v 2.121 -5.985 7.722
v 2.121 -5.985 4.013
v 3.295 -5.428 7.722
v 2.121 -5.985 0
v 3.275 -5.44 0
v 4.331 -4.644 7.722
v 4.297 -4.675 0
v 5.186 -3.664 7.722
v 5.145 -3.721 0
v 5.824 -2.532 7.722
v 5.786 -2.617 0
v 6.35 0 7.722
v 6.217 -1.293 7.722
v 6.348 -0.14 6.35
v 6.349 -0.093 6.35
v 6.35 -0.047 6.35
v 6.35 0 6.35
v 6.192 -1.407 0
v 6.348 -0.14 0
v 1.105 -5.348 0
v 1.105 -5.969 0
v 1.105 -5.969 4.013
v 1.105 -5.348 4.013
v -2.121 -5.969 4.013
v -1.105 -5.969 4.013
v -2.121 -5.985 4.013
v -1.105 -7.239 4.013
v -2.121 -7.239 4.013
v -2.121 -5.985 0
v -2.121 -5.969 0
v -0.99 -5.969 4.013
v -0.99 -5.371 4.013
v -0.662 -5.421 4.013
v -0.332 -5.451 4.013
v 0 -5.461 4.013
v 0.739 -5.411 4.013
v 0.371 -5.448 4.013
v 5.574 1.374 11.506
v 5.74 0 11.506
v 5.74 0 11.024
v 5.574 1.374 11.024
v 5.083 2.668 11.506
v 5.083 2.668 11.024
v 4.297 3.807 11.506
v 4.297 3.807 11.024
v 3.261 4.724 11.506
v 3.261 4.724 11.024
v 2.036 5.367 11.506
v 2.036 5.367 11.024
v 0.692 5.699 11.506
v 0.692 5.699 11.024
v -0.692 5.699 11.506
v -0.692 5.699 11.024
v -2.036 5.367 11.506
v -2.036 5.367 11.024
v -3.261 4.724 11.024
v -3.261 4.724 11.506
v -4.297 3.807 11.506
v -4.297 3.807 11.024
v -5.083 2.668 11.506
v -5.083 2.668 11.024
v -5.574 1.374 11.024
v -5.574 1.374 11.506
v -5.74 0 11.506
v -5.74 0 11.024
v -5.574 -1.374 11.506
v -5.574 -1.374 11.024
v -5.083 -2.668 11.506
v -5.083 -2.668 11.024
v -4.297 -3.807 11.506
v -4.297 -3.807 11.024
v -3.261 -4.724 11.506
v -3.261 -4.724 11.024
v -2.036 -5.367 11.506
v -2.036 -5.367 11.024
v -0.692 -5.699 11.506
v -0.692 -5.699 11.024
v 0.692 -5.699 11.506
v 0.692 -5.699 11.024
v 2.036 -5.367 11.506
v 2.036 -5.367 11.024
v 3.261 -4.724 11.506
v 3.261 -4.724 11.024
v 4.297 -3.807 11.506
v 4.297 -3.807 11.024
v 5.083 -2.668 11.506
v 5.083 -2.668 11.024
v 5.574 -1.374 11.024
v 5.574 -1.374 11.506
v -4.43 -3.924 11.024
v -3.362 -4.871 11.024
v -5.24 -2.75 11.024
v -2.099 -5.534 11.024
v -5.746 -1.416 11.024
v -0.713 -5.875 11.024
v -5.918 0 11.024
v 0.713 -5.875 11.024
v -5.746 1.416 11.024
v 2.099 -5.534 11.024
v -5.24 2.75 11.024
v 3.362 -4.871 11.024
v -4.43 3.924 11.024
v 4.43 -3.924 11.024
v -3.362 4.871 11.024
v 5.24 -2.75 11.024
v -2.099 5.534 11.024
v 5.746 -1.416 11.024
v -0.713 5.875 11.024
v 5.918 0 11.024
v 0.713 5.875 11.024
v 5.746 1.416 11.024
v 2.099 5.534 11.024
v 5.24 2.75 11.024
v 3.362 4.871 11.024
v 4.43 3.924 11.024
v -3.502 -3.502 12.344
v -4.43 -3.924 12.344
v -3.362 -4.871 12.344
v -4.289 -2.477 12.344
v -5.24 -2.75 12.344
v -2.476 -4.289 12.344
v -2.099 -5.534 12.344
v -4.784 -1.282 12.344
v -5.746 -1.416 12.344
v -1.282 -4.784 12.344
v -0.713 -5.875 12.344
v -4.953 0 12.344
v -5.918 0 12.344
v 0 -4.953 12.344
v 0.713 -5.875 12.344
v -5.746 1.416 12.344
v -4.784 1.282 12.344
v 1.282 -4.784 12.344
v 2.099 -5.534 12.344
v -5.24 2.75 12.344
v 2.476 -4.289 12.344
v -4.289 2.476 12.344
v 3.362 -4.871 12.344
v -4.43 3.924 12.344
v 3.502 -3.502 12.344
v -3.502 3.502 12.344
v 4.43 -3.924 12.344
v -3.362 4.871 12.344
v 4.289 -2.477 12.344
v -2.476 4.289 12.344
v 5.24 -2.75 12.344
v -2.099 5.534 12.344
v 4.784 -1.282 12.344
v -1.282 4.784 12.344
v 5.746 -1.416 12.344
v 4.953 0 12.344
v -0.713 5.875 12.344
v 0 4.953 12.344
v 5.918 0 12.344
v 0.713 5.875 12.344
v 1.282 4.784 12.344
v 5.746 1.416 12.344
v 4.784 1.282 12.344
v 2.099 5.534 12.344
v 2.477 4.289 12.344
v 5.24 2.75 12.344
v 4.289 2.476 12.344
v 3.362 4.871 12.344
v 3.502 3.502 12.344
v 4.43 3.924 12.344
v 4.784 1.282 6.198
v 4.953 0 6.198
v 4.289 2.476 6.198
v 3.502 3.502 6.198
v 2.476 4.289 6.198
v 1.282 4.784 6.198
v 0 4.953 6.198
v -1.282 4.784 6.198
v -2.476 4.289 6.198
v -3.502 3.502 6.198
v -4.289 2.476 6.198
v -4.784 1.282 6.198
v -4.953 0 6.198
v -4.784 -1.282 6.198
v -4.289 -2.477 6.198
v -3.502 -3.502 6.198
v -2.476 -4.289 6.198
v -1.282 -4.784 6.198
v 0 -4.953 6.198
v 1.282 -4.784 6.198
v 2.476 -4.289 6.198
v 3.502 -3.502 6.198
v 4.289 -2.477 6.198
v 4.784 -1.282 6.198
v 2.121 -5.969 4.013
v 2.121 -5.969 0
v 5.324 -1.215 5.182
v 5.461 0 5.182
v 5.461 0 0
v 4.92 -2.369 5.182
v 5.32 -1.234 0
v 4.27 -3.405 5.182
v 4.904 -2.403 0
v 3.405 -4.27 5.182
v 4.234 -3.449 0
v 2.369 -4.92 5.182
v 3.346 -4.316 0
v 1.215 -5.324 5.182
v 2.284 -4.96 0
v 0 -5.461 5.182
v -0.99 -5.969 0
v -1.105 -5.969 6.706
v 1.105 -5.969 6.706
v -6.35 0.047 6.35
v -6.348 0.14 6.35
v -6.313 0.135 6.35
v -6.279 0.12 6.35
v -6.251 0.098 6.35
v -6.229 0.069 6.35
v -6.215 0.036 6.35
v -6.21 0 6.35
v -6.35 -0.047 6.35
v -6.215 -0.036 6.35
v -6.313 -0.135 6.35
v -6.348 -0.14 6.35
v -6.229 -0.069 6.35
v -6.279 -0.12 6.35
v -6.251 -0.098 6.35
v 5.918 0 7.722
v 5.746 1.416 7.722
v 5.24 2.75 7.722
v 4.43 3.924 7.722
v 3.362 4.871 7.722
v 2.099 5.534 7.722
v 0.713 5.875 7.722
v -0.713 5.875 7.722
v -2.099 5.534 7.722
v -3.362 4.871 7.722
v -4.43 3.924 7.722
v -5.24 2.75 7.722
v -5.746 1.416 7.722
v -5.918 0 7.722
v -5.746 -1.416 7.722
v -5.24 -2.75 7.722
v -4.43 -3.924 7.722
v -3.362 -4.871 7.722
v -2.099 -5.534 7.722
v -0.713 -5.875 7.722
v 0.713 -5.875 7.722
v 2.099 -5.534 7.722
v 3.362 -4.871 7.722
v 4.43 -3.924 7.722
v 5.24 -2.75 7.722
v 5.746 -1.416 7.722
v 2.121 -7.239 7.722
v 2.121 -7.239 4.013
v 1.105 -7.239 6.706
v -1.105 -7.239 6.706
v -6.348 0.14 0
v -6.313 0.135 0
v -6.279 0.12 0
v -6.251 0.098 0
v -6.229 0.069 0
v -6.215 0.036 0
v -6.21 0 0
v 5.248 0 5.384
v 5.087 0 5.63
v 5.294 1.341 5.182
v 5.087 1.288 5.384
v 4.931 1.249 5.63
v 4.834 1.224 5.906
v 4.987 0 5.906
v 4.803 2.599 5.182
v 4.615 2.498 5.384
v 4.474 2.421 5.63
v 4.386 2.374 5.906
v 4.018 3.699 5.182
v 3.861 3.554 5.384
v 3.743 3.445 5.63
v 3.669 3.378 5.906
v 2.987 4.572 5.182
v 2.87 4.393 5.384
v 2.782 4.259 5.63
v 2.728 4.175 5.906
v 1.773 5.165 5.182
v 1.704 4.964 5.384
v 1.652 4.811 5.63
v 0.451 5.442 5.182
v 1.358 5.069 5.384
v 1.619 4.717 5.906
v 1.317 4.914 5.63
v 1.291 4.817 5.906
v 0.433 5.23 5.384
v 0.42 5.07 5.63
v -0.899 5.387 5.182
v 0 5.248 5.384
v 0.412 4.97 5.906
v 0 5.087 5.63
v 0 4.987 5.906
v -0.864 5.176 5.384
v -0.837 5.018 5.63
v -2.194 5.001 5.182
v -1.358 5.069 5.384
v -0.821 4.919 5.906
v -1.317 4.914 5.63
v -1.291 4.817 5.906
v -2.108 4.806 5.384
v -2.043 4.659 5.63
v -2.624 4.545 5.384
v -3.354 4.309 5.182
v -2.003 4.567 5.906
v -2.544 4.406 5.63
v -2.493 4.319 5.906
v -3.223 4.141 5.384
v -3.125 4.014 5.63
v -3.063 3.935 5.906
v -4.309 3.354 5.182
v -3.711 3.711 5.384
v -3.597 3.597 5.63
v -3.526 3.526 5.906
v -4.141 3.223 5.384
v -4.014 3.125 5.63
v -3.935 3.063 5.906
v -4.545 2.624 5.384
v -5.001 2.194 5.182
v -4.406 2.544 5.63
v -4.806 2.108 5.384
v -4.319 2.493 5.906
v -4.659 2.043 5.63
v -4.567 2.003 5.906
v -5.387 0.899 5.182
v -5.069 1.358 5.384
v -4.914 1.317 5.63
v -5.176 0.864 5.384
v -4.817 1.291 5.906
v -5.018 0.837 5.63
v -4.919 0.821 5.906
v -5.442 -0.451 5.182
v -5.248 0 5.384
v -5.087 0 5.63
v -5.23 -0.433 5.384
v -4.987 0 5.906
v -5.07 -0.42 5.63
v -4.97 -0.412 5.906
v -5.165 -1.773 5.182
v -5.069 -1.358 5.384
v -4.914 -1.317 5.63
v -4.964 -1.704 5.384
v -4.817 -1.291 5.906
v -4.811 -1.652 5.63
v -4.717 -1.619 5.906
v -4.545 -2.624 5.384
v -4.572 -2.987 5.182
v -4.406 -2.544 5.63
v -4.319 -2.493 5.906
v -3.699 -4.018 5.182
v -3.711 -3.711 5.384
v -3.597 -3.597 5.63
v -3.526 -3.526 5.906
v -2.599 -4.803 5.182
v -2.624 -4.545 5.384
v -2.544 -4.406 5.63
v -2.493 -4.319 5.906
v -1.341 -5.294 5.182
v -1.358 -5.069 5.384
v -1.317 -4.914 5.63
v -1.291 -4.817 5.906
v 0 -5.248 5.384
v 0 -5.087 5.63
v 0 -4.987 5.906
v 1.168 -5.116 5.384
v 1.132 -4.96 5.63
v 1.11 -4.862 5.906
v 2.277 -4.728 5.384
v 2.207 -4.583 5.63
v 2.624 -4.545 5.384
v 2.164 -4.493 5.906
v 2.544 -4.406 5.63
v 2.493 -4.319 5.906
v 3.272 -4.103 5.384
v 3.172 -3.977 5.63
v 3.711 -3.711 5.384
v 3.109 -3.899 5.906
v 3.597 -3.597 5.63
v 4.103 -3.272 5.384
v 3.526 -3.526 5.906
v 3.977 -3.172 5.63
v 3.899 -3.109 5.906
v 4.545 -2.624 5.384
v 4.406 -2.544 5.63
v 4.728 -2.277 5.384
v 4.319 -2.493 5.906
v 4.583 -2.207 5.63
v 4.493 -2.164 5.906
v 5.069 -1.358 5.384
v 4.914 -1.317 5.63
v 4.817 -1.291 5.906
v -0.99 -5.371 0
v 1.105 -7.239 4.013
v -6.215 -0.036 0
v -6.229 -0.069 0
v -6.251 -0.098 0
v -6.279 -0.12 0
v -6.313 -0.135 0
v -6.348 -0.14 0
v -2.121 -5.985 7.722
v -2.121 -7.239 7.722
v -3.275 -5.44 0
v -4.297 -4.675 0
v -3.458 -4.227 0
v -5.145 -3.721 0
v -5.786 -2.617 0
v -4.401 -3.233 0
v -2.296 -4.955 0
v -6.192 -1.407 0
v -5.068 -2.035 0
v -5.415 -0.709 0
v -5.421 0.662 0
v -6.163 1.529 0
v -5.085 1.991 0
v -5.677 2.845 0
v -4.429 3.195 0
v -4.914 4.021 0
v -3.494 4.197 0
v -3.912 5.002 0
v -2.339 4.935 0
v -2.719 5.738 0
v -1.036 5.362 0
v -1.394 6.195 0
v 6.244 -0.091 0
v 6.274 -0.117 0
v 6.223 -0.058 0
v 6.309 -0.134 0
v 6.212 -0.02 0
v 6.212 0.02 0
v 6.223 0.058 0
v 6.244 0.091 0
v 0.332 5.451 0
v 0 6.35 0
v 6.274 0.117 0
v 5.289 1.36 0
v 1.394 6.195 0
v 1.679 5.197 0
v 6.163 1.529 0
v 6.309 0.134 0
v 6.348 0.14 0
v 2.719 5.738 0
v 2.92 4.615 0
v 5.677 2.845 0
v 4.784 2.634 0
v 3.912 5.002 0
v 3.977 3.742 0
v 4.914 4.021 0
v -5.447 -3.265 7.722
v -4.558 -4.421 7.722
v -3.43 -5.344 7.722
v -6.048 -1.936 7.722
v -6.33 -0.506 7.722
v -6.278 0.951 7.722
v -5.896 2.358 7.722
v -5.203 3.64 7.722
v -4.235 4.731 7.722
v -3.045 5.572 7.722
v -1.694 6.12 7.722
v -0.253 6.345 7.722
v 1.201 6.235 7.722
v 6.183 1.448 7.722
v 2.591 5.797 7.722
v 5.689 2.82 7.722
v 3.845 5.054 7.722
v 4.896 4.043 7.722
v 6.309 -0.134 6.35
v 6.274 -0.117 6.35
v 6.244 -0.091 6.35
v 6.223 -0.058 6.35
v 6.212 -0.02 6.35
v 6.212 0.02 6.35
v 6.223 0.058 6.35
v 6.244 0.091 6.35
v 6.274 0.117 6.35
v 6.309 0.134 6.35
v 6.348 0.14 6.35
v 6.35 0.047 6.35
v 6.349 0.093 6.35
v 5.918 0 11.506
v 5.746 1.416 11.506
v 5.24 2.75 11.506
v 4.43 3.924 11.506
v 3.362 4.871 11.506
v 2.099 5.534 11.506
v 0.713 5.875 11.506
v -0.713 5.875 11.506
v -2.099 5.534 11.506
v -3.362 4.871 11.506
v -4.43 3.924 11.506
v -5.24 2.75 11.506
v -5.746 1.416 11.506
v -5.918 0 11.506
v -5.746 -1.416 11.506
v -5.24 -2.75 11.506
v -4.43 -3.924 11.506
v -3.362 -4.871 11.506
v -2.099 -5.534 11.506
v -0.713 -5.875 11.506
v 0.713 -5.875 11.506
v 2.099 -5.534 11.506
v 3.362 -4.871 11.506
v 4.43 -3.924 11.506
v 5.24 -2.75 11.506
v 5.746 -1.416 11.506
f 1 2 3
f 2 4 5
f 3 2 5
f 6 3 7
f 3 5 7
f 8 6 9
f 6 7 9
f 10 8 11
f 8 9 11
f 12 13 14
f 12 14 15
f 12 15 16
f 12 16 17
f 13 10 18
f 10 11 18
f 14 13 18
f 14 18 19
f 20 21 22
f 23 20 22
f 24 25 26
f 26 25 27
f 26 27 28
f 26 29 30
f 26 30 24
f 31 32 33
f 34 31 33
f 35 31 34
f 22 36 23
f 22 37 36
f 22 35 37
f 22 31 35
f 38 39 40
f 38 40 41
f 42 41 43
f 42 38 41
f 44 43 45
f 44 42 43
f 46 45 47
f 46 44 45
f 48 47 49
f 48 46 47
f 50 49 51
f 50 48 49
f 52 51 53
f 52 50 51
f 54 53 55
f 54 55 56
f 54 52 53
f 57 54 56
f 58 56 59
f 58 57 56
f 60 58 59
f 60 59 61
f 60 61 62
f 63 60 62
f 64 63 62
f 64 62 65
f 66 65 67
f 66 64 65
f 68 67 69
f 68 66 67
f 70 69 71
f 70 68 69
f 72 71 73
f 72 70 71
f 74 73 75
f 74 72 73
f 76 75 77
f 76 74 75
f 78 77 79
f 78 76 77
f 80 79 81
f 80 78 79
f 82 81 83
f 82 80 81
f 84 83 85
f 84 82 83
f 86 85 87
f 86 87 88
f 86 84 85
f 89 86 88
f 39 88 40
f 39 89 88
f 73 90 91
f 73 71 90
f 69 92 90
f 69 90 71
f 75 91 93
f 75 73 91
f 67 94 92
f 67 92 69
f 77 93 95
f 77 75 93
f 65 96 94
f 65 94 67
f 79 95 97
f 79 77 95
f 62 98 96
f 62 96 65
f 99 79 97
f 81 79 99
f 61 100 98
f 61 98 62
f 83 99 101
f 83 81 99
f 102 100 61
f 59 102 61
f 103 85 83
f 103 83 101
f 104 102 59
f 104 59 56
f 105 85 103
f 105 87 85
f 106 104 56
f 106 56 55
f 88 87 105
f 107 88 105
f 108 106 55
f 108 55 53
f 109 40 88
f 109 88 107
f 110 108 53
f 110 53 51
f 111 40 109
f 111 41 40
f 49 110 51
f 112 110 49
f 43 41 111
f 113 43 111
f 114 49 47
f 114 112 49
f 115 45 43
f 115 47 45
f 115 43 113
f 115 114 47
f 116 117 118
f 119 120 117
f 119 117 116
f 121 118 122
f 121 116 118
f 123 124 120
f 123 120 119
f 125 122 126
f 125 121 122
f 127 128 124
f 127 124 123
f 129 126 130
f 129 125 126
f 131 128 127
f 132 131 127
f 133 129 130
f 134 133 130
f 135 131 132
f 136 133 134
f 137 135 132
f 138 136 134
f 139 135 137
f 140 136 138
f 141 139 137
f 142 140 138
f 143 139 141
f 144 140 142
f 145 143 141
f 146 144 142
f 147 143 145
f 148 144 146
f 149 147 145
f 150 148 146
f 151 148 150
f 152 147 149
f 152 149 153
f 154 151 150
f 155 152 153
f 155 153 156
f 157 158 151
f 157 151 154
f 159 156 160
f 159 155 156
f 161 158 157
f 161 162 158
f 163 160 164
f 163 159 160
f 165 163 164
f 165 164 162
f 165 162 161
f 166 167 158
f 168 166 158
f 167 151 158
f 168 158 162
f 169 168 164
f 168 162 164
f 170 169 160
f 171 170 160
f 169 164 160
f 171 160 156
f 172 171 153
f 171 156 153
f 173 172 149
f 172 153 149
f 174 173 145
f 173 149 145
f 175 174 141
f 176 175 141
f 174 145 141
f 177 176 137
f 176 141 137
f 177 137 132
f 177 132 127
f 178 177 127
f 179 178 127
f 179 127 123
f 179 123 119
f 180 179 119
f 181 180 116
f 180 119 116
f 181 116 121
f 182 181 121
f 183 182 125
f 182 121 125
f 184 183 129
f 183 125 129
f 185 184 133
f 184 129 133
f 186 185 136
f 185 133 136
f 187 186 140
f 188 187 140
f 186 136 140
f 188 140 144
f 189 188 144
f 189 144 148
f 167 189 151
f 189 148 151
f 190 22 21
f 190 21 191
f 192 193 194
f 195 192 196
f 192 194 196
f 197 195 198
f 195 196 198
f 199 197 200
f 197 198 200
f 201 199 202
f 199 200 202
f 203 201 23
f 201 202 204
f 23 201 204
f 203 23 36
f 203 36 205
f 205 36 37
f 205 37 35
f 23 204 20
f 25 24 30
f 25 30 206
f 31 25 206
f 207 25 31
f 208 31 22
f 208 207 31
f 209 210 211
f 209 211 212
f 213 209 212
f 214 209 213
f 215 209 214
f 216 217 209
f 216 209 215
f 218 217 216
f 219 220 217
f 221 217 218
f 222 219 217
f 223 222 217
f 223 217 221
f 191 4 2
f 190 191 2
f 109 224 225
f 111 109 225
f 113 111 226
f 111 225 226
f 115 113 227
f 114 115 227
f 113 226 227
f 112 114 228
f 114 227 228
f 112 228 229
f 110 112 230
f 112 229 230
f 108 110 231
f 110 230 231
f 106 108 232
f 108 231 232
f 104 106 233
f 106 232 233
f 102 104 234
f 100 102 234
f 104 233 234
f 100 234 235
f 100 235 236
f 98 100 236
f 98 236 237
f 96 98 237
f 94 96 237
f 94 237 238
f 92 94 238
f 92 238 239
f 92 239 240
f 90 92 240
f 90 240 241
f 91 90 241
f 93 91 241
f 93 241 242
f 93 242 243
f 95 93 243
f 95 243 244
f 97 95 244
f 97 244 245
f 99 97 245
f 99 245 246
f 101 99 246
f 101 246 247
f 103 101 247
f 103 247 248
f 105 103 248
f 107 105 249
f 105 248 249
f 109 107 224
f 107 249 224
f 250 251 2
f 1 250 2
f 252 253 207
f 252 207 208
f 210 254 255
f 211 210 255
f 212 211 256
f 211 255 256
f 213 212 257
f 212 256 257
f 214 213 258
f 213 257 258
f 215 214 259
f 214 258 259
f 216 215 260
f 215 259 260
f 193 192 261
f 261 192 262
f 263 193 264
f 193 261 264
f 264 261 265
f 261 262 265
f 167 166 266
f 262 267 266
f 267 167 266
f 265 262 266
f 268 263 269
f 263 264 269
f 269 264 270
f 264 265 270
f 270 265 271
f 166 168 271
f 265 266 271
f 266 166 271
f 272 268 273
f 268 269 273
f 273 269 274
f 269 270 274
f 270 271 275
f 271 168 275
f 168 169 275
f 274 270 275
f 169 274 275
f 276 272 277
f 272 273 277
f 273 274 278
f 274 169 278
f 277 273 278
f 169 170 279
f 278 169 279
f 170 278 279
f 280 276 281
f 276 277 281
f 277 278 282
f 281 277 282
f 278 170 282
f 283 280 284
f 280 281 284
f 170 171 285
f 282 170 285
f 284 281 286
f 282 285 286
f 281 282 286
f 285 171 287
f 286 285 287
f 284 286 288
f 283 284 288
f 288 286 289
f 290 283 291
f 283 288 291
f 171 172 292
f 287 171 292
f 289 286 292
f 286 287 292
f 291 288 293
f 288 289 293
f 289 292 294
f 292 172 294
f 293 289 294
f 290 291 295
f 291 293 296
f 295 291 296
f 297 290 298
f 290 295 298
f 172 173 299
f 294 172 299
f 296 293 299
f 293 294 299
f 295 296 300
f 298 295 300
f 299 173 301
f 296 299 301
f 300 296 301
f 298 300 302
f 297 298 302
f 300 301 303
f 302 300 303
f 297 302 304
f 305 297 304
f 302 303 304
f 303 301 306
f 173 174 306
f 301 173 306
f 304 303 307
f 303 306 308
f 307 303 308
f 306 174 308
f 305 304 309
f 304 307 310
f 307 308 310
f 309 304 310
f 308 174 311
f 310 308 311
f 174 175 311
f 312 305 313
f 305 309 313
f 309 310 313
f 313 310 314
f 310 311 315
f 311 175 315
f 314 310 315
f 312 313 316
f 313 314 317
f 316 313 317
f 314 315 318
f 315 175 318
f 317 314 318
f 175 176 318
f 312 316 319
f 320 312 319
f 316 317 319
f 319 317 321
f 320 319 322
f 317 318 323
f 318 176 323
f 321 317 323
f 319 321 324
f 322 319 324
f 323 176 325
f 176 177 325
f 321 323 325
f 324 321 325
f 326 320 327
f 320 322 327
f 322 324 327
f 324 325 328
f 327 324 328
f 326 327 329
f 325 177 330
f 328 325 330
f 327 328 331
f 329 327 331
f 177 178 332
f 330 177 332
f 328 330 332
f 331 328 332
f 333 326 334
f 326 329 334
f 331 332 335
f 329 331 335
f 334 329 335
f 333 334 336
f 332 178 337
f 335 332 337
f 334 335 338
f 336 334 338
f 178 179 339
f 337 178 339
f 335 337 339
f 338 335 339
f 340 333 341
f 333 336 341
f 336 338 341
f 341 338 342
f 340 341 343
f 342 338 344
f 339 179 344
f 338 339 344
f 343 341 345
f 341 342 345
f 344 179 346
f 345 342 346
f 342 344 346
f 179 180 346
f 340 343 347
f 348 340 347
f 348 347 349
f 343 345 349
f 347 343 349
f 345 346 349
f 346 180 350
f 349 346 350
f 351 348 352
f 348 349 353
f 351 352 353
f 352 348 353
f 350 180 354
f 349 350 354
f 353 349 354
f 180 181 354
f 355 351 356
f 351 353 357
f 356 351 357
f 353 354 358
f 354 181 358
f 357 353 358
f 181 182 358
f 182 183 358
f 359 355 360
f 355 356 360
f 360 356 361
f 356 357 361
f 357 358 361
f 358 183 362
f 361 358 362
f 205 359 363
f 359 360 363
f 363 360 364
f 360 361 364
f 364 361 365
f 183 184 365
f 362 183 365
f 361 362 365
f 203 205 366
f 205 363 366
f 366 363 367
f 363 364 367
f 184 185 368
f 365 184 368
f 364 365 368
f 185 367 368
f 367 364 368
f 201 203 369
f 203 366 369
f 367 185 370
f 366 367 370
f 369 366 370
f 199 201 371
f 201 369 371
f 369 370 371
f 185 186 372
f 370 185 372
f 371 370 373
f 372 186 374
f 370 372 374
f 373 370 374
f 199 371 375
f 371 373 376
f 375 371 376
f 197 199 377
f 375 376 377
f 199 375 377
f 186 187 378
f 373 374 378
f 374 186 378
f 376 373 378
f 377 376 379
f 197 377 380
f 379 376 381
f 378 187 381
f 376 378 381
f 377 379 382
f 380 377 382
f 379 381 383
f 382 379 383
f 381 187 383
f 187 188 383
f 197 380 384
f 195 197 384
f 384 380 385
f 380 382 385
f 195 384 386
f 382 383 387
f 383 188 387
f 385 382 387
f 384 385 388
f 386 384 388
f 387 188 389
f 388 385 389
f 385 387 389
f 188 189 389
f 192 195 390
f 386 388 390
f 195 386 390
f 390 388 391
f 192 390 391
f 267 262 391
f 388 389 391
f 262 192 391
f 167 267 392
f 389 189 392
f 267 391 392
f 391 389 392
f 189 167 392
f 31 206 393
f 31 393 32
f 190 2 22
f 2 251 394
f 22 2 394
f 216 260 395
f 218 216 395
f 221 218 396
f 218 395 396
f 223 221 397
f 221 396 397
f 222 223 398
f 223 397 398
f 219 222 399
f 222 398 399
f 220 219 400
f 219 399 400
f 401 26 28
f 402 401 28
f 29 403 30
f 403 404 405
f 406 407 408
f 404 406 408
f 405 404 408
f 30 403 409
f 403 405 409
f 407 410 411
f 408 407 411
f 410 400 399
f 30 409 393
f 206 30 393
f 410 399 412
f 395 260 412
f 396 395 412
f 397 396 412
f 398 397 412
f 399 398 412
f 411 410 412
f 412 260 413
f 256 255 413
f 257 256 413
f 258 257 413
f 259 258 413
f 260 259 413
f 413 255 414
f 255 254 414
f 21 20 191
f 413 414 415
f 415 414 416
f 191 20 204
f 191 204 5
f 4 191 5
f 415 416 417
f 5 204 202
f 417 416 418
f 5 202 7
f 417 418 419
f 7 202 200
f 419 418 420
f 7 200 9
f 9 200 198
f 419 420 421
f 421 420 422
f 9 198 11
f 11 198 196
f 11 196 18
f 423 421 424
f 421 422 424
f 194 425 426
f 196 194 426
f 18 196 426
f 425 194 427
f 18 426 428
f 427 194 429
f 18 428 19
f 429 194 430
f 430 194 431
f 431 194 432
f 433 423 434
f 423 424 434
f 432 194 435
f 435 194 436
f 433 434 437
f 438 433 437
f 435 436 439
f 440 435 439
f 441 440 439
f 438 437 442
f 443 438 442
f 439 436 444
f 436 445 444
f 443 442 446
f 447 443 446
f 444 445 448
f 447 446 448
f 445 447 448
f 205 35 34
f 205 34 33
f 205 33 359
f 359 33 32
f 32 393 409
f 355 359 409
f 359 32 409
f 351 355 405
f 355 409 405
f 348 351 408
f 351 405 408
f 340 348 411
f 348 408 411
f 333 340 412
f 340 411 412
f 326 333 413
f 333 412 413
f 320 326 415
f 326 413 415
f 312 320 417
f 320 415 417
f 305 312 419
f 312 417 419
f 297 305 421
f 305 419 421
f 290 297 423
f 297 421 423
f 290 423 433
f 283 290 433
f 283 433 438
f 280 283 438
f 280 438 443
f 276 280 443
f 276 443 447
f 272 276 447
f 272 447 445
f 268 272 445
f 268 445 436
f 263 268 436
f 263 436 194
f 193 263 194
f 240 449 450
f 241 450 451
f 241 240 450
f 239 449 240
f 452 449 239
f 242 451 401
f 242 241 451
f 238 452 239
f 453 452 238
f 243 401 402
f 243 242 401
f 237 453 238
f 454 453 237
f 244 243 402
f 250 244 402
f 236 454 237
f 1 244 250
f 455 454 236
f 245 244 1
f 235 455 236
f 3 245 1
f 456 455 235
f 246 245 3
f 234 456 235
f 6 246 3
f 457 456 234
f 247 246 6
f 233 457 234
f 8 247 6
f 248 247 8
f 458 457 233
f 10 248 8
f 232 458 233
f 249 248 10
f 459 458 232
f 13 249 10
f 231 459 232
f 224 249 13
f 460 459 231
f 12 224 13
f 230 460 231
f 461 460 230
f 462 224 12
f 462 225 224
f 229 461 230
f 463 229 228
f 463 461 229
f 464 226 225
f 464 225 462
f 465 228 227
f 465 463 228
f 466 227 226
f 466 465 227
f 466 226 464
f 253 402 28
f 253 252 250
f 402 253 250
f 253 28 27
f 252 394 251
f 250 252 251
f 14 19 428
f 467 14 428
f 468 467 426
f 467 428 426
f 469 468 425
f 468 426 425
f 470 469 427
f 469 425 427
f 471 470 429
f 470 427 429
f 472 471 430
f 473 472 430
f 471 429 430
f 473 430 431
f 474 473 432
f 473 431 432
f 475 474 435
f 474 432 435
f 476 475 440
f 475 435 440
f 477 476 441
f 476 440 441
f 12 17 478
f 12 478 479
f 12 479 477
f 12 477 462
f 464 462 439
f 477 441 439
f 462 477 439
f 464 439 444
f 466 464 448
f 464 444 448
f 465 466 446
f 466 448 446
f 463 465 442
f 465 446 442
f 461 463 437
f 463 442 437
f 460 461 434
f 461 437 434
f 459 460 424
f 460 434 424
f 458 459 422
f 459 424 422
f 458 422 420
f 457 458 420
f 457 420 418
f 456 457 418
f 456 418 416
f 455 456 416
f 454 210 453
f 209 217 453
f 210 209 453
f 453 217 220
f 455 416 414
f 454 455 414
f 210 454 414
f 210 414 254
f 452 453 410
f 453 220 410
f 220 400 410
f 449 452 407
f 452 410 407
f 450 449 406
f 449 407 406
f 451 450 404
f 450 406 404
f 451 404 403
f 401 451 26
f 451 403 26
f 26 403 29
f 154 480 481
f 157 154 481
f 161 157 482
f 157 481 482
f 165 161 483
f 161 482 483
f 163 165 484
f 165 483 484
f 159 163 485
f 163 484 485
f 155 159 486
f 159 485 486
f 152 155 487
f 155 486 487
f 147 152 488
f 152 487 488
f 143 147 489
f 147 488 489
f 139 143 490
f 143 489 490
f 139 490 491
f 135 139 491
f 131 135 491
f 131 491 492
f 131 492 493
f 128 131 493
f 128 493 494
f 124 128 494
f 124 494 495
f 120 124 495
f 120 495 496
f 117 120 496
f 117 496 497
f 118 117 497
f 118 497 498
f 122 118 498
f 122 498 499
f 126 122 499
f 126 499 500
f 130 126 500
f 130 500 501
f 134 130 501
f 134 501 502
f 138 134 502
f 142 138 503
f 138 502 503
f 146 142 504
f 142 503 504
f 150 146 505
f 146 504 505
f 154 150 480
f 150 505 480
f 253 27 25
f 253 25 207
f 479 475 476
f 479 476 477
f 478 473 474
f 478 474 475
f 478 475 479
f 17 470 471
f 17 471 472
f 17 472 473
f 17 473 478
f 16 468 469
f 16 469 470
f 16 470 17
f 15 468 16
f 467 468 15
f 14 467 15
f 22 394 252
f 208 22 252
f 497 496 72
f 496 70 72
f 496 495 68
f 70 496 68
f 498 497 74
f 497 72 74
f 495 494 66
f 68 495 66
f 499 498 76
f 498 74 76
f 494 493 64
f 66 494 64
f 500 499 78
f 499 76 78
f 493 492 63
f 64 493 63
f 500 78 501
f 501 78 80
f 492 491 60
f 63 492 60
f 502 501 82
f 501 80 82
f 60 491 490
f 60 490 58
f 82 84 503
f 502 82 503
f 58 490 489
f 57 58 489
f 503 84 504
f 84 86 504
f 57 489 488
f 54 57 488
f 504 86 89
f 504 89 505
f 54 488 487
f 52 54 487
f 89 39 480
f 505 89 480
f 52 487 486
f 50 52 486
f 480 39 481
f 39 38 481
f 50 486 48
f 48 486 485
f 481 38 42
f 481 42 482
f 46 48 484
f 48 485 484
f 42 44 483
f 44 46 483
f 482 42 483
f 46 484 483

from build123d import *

# Parameters (mm, degrees)
F1_DEPTH      = 7.7216
F2_W          = 2.2098
F2_H          = 4.0132
F2_W_2        = 1.016
F2_H_2        = 2.6924
F3_DEPTH      = 1.27
F5_DEPTH      = 6.35
F6_R          = 5.9182
F6_R_2        = 4.953
F7_DEPTH      = 4.6228
F7_DEPTH_BACK = 2.54
F9_START      = -0.8382
F8_R          = 5.9182
F8_R_2        = 5.7404
F8_R_3        = 4.953
F9_DEPTH      = 0.4826
F11_W         = 2.0946894925
F11_H         = 4.0132
F12_DEPTH     = 0.6219426901


# Not quite as in the source:
# - a fillet or chamfer that OpenCascade refuses, or shapes differently, is made with other operations: its cross-section is extruded or revolved along the edge and cut away or added


with BuildPart() as f1:
    # F0 (on Top) → F1 (new body)
    with BuildSketch(Plane.XY):
        with BuildLine():
            ThreePointArc((2.1209, -5.9853390205), (0, -6.35), (-2.1209, -5.9853390205))
            Line((-2.1209, -5.9853390205), (-2.1209, -7.239))
            Line((-2.1209, -7.239), (2.1209, -7.239))
            Line((2.1209, -7.239), (2.1209, -5.9853390205))
        make_face()
        with BuildLine():
            Line((-2.1209, -5.461), (-2.1209, -5.9853390205))
            ThreePointArc((-2.1209, -5.9853390205), (0, -6.35), (2.1209, -5.9853390205))
            Line((2.1209, -5.9853390205), (2.1209, -5.461))
            Line((2.1209, -5.461), (0, -5.461))
            Line((0, -5.461), (-2.1209, -5.461))
        make_face()
        with BuildLine():
            ThreePointArc((2.1209, -5.9853390205), (5.1860493152, -3.6643406637), (6.35, 0))
            ThreePointArc((6.35, 0), (-3.6643406637, 5.1860493152), (-2.1209, -5.9853390205))
            Line((-2.1209, -5.9853390205), (-2.1209, -5.461))
            Line((-2.1209, -5.461), (0, -5.461))
            Line((0, -5.461), (2.1209, -5.461))
            Line((2.1209, -5.461), (2.1209, -5.9853390205))
        make_face()
        with BuildLine():
            ThreePointArc((5.461, 0), (3.8615101321, -3.8615101321), (0, -5.461))
            ThreePointArc((0, -5.461), (-3.8615101321, 3.8615101321), (5.461, 0))
        make_face(mode=Mode.SUBTRACT)
    extrude(amount=F1_DEPTH)

    # F2 (on face) → F3 (cut)
    with BuildSketch(Plane.XZ.offset(7.239)):
        with Locations((0, 2.0066)):
            Rectangle(F2_W, F2_H)
        with Locations((-1.6129, 2.0066)):
            Rectangle(F2_W_2, F2_H)
        with Locations((1.6129, 2.0066)):
            Rectangle(F2_W_2, F2_H)
        with Locations((0, 5.3594)):
            Rectangle(F2_W, F2_H_2)
    extrude(amount=-F3_DEPTH, mode=Mode.SUBTRACT)

    # F4 (on face) → F5 (cut)
    with BuildSketch(Plane(origin=(0, 0, 0), x_dir=(1, 0, 0), z_dir=(0, 0, -1))):
        with BuildLine():
            ThreePointArc((6.3484633, 0.1396915479), (6.2103, 0), (6.3484633, -0.1396915479))
            ThreePointArc((6.3484633, -0.1396915479), (6.35, 0), (6.3484633, 0.1396915479))
        make_face()
        with BuildLine():
            ThreePointArc((6.3484633, 0.1396915479), (6.35, 0), (6.3484633, -0.1396915479))
            ThreePointArc((6.3484633, -0.1396915479), (6.4482380095, -0.0993246369), (6.4897, 0))
            ThreePointArc((6.4897, 0), (6.4482380095, 0.0993246369), (6.3484633, 0.1396915479))
        make_face()
        with BuildLine():
            ThreePointArc((-6.3484633, -0.1396915479), (-6.2506753631, -0.0982380095), (-6.2103, 0))
            ThreePointArc((-6.2103, 0), (-6.2506753631, 0.0982380095), (-6.3484633, 0.1396915479))
            ThreePointArc((-6.3484633, 0.1396915479), (-6.35, 0), (-6.3484633, -0.1396915479))
        make_face()
        with BuildLine():
            ThreePointArc((-6.3484633, -0.1396915479), (-6.35, 0), (-6.3484633, 0.1396915479))
            ThreePointArc((-6.3484633, 0.1396915479), (-6.4897, 0), (-6.3484633, -0.1396915479))
        make_face()
    extrude(amount=-F5_DEPTH, mode=Mode.SUBTRACT)

    # F6 (on face) → F7 (join, two sides)
    with BuildSketch(Plane.XY.offset(7.7216)) as f7_sk:
        Circle(F6_R)
        Circle(F6_R_2, mode=Mode.SUBTRACT)
    extrude(amount=F7_DEPTH)
    extrude(f7_sk.sketch, amount=-F7_DEPTH_BACK)

    # F8 (on face) → F9 (cut)
    with BuildSketch(Plane.XY.offset(12.3444).offset(F9_START)):
        Circle(F8_R)
        Circle(F8_R_2, mode=Mode.SUBTRACT)
        Circle(F8_R_3)
    extrude(amount=-F9_DEPTH, mode=Mode.SUBTRACT)

    # F10: fillet of radius 1.27 on 1 edges, made by hand

    # F10_s1 → F10_t2 (revolve, cut)
    with BuildSketch(Plane.XZ):
        with BuildLine():
            ThreePointArc((5.461, 5.1816), (5.0870774674, 5.6296387337), (4.953, 6.1976))
            Line((4.953, 6.1976), (4.9276, 6.1976))
            Line((4.9276, 6.1976), (4.9276, 5.1816))
            Line((4.9276, 5.1816), (4.953, 5.1562))
            ThreePointArc((4.953, 5.1562), (5.207, 5.1562), (5.44576, 5.16128))
            Line((5.44576, 5.16128), (5.461, 5.1816))
        make_face()
    revolve(axis=Axis((0, 0, 5.1816), (0, 0, 1)), mode=Mode.SUBTRACT)

    # F11 (on face) → F12 (cut, through all)
    with BuildSketch(Plane.XZ.offset(5.969)):
        with Locations((0.0575552538, 2.0066)):
            Rectangle(F11_W, F11_H)
    extrude(amount=-F12_DEPTH, mode=Mode.SUBTRACT)


solid = f1.part
